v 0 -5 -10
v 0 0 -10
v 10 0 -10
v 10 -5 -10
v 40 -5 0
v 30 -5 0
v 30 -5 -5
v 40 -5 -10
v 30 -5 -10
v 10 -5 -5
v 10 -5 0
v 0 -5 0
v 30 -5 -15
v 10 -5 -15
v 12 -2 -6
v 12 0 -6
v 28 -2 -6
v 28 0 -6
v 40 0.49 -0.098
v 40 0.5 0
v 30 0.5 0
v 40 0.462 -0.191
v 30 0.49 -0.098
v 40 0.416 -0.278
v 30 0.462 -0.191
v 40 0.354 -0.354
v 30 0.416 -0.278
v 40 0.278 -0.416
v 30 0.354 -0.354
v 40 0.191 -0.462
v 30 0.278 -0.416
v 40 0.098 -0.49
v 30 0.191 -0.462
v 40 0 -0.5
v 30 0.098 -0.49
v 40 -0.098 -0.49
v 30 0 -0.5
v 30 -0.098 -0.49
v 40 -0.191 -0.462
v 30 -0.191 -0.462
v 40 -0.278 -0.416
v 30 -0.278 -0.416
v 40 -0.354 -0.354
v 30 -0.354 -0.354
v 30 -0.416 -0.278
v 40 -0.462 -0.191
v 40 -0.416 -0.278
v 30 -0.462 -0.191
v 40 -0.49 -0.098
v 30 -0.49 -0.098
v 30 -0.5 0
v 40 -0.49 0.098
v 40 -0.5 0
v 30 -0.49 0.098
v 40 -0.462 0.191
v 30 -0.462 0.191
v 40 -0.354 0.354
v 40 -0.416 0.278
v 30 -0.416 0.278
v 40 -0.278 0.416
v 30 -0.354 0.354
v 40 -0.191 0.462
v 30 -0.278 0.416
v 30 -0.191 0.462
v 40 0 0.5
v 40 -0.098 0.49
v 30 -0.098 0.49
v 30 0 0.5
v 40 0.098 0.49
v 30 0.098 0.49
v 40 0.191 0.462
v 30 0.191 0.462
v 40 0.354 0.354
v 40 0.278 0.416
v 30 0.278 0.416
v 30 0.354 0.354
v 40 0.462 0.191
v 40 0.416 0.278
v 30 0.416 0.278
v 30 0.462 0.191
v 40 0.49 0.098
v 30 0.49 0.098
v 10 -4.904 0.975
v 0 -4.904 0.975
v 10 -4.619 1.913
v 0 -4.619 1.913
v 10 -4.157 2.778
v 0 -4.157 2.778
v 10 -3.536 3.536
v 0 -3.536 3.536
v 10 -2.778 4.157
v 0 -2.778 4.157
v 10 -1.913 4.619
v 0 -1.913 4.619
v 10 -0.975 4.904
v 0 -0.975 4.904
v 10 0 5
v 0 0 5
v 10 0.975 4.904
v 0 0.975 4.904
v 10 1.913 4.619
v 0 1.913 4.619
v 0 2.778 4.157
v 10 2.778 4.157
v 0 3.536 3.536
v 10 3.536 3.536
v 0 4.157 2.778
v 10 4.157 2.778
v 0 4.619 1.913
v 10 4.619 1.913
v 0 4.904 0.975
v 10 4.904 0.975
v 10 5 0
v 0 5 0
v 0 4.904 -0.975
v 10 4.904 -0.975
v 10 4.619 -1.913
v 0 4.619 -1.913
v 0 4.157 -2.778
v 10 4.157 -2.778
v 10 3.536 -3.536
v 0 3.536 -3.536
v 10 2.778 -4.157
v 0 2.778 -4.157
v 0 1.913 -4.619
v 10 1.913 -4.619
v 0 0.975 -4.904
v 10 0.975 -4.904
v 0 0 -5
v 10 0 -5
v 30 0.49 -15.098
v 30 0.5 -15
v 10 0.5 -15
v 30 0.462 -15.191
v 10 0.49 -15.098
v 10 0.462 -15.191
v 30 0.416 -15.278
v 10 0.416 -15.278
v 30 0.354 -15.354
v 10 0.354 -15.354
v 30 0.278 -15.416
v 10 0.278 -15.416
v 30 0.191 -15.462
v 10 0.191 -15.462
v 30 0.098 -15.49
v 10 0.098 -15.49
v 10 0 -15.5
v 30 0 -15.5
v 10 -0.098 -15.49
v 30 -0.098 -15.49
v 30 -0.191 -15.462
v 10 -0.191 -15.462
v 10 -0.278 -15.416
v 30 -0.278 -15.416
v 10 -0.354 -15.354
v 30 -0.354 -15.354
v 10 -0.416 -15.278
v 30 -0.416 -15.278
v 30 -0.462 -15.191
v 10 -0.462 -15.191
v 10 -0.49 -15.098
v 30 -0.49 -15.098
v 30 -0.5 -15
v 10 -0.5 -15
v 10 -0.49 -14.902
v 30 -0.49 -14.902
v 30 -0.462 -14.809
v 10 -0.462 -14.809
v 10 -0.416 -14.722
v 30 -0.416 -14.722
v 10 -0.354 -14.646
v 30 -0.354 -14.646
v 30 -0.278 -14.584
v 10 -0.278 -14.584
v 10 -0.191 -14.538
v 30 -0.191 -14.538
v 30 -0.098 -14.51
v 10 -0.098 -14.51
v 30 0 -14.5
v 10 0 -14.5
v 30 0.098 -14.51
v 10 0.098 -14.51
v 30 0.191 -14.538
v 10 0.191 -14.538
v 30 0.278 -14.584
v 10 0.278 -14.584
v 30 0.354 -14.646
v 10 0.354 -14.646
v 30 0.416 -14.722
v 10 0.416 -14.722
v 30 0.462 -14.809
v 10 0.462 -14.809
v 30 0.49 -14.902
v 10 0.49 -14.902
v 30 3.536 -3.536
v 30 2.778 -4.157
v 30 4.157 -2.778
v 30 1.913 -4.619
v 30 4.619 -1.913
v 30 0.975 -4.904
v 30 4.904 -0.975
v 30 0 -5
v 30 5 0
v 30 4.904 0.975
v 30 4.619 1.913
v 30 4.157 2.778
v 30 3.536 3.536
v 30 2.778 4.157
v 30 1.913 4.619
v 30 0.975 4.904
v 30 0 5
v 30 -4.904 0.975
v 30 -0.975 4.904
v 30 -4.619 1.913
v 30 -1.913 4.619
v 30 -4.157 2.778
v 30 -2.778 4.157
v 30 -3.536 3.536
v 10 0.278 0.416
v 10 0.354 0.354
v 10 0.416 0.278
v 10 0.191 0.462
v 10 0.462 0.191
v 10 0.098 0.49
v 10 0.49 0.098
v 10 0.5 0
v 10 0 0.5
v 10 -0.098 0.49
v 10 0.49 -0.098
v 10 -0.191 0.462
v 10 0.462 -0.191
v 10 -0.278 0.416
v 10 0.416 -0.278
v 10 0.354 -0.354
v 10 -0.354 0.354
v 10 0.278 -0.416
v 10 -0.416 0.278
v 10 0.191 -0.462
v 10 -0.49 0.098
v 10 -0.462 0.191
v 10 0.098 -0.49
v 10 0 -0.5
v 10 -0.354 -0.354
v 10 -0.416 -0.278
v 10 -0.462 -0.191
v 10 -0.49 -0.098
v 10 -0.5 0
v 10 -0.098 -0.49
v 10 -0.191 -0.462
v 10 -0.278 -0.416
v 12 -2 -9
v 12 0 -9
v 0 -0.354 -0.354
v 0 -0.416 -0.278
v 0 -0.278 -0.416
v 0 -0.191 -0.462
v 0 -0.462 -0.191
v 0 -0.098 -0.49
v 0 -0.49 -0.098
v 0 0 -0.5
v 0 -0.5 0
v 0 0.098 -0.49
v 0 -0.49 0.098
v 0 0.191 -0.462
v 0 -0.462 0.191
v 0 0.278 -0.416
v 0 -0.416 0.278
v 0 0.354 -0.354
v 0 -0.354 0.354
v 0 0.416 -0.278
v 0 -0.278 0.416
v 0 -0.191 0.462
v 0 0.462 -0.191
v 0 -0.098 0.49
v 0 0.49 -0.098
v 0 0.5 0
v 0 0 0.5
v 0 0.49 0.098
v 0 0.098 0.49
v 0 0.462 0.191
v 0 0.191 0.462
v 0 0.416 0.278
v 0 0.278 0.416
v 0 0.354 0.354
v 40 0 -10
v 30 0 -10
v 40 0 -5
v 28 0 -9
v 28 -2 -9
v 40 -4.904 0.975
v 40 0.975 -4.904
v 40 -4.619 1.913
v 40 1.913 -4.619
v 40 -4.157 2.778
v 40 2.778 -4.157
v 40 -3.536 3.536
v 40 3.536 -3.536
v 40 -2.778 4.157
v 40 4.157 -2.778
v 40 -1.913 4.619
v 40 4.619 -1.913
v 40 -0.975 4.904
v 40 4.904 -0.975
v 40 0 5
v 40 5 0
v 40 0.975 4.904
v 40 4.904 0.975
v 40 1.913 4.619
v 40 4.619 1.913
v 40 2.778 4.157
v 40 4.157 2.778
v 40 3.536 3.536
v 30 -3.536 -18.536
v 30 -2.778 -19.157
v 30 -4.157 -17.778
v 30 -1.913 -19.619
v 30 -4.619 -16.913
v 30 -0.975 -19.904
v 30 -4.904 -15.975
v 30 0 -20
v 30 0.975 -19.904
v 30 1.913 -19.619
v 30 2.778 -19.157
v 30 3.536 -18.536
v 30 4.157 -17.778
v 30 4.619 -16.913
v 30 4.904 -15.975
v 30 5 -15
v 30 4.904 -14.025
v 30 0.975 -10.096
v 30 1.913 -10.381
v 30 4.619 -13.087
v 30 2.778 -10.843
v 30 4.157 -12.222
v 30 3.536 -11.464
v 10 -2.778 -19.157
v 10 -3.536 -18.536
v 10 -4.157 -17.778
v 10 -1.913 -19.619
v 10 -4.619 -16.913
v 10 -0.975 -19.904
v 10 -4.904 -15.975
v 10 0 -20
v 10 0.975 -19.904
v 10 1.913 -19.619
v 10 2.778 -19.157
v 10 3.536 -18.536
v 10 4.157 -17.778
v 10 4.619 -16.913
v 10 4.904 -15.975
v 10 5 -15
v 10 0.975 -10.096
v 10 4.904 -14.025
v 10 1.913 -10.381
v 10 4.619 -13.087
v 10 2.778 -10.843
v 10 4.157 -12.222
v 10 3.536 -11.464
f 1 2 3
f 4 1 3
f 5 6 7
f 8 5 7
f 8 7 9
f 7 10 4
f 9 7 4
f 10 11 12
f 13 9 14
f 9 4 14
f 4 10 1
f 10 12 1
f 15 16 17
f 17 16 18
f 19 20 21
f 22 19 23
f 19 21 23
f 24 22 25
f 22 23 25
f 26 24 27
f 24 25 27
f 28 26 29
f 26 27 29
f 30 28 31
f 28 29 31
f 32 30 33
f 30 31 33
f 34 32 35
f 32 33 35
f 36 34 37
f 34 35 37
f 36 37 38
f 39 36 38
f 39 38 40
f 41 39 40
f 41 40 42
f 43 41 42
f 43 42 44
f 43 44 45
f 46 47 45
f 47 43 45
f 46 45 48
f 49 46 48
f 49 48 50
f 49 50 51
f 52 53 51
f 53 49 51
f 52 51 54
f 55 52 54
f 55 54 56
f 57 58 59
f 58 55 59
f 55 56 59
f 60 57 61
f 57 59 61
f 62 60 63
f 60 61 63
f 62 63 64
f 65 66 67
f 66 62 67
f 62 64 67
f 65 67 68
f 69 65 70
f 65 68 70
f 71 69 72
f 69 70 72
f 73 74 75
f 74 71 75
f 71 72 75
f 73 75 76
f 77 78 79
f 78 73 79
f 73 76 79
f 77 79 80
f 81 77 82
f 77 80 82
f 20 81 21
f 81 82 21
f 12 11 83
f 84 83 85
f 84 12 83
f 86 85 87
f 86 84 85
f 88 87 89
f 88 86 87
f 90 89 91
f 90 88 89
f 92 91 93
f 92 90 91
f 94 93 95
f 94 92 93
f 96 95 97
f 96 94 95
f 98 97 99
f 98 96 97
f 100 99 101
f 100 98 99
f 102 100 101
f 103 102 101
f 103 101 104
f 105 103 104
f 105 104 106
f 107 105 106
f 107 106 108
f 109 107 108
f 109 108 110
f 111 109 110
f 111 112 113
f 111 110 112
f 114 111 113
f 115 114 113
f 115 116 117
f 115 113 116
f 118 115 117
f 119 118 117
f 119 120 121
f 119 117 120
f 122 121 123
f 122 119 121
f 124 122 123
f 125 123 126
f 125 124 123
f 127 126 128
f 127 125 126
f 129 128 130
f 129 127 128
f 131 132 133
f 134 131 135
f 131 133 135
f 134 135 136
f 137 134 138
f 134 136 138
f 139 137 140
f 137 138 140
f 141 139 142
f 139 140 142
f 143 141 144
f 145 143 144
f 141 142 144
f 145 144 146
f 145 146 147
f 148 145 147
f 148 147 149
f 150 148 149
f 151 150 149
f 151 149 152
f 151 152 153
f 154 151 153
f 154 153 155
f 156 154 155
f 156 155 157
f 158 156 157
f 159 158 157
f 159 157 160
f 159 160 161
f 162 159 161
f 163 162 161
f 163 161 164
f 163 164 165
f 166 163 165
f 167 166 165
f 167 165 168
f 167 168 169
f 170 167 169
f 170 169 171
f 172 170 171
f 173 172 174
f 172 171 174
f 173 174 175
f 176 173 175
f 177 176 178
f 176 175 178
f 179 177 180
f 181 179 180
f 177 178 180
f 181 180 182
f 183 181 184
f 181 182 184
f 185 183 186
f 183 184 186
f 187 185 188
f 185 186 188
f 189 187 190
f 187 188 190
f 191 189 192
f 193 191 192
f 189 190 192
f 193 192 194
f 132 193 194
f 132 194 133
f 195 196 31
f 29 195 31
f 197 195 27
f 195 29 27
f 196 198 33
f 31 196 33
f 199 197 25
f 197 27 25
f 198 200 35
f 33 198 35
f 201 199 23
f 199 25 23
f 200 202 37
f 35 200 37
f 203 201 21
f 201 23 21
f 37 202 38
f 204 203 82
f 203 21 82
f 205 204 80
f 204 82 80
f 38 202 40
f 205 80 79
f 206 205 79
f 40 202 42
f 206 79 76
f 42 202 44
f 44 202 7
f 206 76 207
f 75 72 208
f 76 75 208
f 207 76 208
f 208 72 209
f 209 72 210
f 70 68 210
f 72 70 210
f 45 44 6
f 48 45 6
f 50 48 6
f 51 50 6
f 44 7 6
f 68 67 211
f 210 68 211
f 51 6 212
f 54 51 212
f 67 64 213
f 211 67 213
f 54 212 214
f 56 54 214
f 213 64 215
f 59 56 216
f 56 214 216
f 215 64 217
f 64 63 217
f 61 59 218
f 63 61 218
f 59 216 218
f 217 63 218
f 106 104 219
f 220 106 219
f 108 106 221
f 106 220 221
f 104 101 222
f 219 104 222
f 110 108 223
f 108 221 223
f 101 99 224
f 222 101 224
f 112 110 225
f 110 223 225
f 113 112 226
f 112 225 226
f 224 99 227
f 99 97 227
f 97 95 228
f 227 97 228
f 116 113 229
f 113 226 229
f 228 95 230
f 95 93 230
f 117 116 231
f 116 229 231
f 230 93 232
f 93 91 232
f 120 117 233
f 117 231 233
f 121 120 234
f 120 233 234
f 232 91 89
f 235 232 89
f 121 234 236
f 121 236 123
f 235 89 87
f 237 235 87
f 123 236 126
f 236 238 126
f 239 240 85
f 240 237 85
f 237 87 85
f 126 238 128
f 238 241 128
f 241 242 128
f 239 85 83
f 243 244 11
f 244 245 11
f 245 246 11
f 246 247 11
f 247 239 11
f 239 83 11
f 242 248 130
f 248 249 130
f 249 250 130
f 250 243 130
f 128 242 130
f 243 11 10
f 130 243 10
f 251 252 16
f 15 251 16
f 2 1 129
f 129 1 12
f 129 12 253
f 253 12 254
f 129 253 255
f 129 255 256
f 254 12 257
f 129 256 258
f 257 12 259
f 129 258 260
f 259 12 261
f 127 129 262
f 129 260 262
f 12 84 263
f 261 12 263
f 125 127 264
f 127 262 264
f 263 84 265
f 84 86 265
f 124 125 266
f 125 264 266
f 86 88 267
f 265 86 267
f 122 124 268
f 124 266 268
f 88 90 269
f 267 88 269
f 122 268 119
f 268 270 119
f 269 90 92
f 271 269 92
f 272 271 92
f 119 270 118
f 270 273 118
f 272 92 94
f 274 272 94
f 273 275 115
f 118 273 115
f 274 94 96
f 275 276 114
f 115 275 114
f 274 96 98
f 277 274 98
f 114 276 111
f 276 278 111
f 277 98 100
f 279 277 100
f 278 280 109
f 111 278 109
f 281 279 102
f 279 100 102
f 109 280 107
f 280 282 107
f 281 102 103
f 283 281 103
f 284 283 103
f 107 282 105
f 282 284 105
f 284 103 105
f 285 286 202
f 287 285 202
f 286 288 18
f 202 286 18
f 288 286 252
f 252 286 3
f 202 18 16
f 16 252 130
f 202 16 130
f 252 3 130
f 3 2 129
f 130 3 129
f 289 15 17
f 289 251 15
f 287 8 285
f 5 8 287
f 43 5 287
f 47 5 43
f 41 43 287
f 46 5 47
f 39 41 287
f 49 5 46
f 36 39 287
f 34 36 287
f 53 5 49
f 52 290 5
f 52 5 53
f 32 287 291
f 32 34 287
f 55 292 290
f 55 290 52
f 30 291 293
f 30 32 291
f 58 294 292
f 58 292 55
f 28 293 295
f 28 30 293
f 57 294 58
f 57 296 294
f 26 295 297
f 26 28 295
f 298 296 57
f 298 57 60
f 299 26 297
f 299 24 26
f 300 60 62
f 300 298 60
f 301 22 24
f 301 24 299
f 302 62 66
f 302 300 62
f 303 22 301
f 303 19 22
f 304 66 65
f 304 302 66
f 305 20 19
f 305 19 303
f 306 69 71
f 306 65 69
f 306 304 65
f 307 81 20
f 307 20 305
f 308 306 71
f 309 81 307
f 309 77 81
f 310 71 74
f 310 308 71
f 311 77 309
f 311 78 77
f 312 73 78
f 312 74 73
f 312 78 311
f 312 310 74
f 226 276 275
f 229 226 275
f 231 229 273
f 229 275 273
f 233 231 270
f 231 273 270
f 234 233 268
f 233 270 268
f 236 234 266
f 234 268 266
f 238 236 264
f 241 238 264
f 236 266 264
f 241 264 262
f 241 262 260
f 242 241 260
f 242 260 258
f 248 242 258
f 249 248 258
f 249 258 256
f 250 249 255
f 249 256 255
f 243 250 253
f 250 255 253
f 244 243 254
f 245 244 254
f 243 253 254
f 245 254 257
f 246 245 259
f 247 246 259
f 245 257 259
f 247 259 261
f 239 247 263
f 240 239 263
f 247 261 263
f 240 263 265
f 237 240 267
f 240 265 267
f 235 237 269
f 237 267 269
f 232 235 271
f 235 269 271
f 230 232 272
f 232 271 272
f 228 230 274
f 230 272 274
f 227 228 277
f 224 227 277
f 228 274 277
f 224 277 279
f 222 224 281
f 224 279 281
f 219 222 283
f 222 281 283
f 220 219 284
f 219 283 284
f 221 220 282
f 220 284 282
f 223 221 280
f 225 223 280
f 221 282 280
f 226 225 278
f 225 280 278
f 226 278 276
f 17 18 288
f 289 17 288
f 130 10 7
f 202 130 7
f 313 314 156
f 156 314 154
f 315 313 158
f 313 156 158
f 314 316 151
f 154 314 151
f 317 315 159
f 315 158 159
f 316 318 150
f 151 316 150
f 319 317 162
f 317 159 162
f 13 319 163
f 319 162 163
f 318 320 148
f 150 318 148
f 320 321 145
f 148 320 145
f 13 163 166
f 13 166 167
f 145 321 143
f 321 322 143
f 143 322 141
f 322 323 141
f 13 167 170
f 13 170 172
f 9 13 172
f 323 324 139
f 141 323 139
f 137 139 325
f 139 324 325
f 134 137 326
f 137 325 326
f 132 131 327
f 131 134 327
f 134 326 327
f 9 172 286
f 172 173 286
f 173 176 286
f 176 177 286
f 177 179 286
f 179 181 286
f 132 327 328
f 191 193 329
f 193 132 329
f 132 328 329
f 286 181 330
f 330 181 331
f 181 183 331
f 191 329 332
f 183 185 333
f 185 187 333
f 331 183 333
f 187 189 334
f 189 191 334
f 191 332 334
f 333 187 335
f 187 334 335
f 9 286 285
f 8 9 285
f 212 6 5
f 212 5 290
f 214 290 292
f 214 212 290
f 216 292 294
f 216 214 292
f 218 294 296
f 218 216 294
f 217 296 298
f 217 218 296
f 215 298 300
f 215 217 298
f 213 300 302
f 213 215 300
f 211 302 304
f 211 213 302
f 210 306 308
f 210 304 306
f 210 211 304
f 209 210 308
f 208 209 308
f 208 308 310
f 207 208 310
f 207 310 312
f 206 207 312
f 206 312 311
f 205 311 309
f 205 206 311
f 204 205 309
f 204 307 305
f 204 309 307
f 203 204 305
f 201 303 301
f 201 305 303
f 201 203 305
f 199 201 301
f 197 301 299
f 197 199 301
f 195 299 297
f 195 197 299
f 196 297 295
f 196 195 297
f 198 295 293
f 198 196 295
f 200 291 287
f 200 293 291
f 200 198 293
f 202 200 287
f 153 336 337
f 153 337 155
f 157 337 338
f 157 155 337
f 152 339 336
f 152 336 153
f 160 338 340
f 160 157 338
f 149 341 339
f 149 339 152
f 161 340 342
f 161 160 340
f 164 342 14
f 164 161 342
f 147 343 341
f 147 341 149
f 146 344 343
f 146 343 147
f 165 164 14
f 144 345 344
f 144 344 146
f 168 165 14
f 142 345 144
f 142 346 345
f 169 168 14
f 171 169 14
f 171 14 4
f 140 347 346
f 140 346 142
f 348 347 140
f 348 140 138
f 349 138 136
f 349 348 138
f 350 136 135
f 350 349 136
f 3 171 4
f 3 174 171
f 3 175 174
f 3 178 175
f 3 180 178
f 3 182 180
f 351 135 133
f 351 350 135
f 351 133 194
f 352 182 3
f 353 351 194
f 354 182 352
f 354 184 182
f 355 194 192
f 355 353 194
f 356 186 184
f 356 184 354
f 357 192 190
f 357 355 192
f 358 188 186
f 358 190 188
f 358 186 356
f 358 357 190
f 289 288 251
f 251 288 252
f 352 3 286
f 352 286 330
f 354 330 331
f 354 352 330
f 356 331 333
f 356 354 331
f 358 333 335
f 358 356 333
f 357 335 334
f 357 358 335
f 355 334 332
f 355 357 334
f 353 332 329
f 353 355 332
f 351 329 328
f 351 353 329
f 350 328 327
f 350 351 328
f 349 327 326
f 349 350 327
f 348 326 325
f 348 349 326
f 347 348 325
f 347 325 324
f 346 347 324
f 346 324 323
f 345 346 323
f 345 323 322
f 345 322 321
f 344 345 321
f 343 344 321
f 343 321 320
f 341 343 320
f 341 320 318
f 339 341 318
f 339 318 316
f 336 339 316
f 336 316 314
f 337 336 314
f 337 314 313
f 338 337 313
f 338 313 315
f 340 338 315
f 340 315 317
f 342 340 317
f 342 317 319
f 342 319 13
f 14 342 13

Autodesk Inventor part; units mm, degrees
ref_plane "YZ Plane" through (0, 0, 0) normal (1, 0, 0) x (0, 1, 0)
ref_plane "XZ Plane" through (0, 0, 0) normal (0, 1, 0) x (-1, 0, 0)
ref_plane "XY Plane" through (0, 0, 0) normal (0, 0, 1) x (1, 0, 0)
sketch "Эскиз1" plane through (0, 0, 0) normal (1, 0, 0) x (0, 1, 0)
  line L0 (0, 0) -> (-5, 0)
  line L1 (-5, 0) -> (-5, -15)
  line L2 (-5, -15) -> (0, -15)
  line L3 (0, -15) -> (0, 0)
  circle A0 centre (0, 0) radius 5
  circle A1 centre (0, -15) radius 5
  circle A2 centre (0, 0) radius 0.5
  circle A3 centre (0, -15) radius 0.5
  point P0 (0, -5)
  point P1 (0, -10)
  dimension "d0" = 5
  dimension "d1" = 15
  dimension "d4" = 1
  dimension "d5" = 1
extrude "Выдавливание1" add sketch "Эскиз1" along normal blind 40 contours A2 L3 A0 L0 | L0 A0 L3 A2 | A0 L3 A1 L1 | A1 L3 A3 L2 | L2 A3 L3 A1
sketch "Эскиз2" plane through (0, 0, -5) normal (0, 1, 0) x (1, 0, 0)
  line L0 (0, 0) -> (40, 0) projected
  line L1 (0, -10) -> (40, -10) projected
  line L2 (10, 0) -> (30, 0)
  line L3 (30, 0) -> (30, -10)
  line L4 (30, -10) -> (10, -10)
  line L5 (10, -10) -> (10, 0)
  line L6 (0, 5) -> (0, 0) projected
  line L7 (40, 5) -> (40, 0) projected
  point P0 (0, -5)
  dimension "d6" = 10
  dimension "d7" = 10
extrude "Выдавливание2" cut sketch "Эскиз2" along normal mid plane 10
sketch "Эскиз3" plane through (0, 0, -5) normal (0, 1, 0) x (1, 0, 0)
  line L0 (0, 5) -> (40, 5) projected
  line L1 (0, 15) -> (40, 15) projected
  line L2 (10, 5) -> (0, 5)
  line L3 (0, 5) -> (0, 15)
  line L4 (0, 15) -> (10, 15)
  line L5 (10, 15) -> (10, 5)
  line L6 (40, 5) -> (40, 15) projected
  line L7 (30, 5) -> (40, 5)
  line L8 (40, 5) -> (40, 15)
  line L9 (40, 15) -> (30, 15)
  line L10 (30, 15) -> (30, 5)
  line L11 (40, 5) -> (40, 0) projected
  line L12 (0, 5) -> (0, 0) projected
  point P0 (0, -5)
  point P1 (40, 10)
  point P2 (10, 15)
  dimension "d10" = 10
  dimension "d11" = 10
extrude "Выдавливание3" cut sketch "Эскиз3" against normal mid plane 10 contours L3 L1 L5 L0 | L10 L1 L6 L0
sketch "Эскиз10" plane through (10, 0, -5) normal (0, 1, 0) x (1, 0, 0)
  line L0 (2, 1) -> (18, 1)
  line L1 (18, 1) -> (18, 4)
  line L2 (18, 4) -> (2, 4)
  line L3 (2, 4) -> (2, 1)
  line L4 (20, -10) -> (20, 0) projected
  line L5 (0, 5) -> (0, 15) projected
  line L6 (0, 0) -> (20, 0) projected
  line L7 (-10, 5) -> (0, 5) projected
  point P0 (-10, -5)
  point P1 (20, -5)
  point P2 (0, 10)
  dimension "d37" = 2
  dimension "d38" = 2
  dimension "d39" = 1
  dimension "d40" = 1
extrude "Выдавливание9" cut sketch "Эскиз10" against normal blind 2
properties part number "фаланга гусеницы"
